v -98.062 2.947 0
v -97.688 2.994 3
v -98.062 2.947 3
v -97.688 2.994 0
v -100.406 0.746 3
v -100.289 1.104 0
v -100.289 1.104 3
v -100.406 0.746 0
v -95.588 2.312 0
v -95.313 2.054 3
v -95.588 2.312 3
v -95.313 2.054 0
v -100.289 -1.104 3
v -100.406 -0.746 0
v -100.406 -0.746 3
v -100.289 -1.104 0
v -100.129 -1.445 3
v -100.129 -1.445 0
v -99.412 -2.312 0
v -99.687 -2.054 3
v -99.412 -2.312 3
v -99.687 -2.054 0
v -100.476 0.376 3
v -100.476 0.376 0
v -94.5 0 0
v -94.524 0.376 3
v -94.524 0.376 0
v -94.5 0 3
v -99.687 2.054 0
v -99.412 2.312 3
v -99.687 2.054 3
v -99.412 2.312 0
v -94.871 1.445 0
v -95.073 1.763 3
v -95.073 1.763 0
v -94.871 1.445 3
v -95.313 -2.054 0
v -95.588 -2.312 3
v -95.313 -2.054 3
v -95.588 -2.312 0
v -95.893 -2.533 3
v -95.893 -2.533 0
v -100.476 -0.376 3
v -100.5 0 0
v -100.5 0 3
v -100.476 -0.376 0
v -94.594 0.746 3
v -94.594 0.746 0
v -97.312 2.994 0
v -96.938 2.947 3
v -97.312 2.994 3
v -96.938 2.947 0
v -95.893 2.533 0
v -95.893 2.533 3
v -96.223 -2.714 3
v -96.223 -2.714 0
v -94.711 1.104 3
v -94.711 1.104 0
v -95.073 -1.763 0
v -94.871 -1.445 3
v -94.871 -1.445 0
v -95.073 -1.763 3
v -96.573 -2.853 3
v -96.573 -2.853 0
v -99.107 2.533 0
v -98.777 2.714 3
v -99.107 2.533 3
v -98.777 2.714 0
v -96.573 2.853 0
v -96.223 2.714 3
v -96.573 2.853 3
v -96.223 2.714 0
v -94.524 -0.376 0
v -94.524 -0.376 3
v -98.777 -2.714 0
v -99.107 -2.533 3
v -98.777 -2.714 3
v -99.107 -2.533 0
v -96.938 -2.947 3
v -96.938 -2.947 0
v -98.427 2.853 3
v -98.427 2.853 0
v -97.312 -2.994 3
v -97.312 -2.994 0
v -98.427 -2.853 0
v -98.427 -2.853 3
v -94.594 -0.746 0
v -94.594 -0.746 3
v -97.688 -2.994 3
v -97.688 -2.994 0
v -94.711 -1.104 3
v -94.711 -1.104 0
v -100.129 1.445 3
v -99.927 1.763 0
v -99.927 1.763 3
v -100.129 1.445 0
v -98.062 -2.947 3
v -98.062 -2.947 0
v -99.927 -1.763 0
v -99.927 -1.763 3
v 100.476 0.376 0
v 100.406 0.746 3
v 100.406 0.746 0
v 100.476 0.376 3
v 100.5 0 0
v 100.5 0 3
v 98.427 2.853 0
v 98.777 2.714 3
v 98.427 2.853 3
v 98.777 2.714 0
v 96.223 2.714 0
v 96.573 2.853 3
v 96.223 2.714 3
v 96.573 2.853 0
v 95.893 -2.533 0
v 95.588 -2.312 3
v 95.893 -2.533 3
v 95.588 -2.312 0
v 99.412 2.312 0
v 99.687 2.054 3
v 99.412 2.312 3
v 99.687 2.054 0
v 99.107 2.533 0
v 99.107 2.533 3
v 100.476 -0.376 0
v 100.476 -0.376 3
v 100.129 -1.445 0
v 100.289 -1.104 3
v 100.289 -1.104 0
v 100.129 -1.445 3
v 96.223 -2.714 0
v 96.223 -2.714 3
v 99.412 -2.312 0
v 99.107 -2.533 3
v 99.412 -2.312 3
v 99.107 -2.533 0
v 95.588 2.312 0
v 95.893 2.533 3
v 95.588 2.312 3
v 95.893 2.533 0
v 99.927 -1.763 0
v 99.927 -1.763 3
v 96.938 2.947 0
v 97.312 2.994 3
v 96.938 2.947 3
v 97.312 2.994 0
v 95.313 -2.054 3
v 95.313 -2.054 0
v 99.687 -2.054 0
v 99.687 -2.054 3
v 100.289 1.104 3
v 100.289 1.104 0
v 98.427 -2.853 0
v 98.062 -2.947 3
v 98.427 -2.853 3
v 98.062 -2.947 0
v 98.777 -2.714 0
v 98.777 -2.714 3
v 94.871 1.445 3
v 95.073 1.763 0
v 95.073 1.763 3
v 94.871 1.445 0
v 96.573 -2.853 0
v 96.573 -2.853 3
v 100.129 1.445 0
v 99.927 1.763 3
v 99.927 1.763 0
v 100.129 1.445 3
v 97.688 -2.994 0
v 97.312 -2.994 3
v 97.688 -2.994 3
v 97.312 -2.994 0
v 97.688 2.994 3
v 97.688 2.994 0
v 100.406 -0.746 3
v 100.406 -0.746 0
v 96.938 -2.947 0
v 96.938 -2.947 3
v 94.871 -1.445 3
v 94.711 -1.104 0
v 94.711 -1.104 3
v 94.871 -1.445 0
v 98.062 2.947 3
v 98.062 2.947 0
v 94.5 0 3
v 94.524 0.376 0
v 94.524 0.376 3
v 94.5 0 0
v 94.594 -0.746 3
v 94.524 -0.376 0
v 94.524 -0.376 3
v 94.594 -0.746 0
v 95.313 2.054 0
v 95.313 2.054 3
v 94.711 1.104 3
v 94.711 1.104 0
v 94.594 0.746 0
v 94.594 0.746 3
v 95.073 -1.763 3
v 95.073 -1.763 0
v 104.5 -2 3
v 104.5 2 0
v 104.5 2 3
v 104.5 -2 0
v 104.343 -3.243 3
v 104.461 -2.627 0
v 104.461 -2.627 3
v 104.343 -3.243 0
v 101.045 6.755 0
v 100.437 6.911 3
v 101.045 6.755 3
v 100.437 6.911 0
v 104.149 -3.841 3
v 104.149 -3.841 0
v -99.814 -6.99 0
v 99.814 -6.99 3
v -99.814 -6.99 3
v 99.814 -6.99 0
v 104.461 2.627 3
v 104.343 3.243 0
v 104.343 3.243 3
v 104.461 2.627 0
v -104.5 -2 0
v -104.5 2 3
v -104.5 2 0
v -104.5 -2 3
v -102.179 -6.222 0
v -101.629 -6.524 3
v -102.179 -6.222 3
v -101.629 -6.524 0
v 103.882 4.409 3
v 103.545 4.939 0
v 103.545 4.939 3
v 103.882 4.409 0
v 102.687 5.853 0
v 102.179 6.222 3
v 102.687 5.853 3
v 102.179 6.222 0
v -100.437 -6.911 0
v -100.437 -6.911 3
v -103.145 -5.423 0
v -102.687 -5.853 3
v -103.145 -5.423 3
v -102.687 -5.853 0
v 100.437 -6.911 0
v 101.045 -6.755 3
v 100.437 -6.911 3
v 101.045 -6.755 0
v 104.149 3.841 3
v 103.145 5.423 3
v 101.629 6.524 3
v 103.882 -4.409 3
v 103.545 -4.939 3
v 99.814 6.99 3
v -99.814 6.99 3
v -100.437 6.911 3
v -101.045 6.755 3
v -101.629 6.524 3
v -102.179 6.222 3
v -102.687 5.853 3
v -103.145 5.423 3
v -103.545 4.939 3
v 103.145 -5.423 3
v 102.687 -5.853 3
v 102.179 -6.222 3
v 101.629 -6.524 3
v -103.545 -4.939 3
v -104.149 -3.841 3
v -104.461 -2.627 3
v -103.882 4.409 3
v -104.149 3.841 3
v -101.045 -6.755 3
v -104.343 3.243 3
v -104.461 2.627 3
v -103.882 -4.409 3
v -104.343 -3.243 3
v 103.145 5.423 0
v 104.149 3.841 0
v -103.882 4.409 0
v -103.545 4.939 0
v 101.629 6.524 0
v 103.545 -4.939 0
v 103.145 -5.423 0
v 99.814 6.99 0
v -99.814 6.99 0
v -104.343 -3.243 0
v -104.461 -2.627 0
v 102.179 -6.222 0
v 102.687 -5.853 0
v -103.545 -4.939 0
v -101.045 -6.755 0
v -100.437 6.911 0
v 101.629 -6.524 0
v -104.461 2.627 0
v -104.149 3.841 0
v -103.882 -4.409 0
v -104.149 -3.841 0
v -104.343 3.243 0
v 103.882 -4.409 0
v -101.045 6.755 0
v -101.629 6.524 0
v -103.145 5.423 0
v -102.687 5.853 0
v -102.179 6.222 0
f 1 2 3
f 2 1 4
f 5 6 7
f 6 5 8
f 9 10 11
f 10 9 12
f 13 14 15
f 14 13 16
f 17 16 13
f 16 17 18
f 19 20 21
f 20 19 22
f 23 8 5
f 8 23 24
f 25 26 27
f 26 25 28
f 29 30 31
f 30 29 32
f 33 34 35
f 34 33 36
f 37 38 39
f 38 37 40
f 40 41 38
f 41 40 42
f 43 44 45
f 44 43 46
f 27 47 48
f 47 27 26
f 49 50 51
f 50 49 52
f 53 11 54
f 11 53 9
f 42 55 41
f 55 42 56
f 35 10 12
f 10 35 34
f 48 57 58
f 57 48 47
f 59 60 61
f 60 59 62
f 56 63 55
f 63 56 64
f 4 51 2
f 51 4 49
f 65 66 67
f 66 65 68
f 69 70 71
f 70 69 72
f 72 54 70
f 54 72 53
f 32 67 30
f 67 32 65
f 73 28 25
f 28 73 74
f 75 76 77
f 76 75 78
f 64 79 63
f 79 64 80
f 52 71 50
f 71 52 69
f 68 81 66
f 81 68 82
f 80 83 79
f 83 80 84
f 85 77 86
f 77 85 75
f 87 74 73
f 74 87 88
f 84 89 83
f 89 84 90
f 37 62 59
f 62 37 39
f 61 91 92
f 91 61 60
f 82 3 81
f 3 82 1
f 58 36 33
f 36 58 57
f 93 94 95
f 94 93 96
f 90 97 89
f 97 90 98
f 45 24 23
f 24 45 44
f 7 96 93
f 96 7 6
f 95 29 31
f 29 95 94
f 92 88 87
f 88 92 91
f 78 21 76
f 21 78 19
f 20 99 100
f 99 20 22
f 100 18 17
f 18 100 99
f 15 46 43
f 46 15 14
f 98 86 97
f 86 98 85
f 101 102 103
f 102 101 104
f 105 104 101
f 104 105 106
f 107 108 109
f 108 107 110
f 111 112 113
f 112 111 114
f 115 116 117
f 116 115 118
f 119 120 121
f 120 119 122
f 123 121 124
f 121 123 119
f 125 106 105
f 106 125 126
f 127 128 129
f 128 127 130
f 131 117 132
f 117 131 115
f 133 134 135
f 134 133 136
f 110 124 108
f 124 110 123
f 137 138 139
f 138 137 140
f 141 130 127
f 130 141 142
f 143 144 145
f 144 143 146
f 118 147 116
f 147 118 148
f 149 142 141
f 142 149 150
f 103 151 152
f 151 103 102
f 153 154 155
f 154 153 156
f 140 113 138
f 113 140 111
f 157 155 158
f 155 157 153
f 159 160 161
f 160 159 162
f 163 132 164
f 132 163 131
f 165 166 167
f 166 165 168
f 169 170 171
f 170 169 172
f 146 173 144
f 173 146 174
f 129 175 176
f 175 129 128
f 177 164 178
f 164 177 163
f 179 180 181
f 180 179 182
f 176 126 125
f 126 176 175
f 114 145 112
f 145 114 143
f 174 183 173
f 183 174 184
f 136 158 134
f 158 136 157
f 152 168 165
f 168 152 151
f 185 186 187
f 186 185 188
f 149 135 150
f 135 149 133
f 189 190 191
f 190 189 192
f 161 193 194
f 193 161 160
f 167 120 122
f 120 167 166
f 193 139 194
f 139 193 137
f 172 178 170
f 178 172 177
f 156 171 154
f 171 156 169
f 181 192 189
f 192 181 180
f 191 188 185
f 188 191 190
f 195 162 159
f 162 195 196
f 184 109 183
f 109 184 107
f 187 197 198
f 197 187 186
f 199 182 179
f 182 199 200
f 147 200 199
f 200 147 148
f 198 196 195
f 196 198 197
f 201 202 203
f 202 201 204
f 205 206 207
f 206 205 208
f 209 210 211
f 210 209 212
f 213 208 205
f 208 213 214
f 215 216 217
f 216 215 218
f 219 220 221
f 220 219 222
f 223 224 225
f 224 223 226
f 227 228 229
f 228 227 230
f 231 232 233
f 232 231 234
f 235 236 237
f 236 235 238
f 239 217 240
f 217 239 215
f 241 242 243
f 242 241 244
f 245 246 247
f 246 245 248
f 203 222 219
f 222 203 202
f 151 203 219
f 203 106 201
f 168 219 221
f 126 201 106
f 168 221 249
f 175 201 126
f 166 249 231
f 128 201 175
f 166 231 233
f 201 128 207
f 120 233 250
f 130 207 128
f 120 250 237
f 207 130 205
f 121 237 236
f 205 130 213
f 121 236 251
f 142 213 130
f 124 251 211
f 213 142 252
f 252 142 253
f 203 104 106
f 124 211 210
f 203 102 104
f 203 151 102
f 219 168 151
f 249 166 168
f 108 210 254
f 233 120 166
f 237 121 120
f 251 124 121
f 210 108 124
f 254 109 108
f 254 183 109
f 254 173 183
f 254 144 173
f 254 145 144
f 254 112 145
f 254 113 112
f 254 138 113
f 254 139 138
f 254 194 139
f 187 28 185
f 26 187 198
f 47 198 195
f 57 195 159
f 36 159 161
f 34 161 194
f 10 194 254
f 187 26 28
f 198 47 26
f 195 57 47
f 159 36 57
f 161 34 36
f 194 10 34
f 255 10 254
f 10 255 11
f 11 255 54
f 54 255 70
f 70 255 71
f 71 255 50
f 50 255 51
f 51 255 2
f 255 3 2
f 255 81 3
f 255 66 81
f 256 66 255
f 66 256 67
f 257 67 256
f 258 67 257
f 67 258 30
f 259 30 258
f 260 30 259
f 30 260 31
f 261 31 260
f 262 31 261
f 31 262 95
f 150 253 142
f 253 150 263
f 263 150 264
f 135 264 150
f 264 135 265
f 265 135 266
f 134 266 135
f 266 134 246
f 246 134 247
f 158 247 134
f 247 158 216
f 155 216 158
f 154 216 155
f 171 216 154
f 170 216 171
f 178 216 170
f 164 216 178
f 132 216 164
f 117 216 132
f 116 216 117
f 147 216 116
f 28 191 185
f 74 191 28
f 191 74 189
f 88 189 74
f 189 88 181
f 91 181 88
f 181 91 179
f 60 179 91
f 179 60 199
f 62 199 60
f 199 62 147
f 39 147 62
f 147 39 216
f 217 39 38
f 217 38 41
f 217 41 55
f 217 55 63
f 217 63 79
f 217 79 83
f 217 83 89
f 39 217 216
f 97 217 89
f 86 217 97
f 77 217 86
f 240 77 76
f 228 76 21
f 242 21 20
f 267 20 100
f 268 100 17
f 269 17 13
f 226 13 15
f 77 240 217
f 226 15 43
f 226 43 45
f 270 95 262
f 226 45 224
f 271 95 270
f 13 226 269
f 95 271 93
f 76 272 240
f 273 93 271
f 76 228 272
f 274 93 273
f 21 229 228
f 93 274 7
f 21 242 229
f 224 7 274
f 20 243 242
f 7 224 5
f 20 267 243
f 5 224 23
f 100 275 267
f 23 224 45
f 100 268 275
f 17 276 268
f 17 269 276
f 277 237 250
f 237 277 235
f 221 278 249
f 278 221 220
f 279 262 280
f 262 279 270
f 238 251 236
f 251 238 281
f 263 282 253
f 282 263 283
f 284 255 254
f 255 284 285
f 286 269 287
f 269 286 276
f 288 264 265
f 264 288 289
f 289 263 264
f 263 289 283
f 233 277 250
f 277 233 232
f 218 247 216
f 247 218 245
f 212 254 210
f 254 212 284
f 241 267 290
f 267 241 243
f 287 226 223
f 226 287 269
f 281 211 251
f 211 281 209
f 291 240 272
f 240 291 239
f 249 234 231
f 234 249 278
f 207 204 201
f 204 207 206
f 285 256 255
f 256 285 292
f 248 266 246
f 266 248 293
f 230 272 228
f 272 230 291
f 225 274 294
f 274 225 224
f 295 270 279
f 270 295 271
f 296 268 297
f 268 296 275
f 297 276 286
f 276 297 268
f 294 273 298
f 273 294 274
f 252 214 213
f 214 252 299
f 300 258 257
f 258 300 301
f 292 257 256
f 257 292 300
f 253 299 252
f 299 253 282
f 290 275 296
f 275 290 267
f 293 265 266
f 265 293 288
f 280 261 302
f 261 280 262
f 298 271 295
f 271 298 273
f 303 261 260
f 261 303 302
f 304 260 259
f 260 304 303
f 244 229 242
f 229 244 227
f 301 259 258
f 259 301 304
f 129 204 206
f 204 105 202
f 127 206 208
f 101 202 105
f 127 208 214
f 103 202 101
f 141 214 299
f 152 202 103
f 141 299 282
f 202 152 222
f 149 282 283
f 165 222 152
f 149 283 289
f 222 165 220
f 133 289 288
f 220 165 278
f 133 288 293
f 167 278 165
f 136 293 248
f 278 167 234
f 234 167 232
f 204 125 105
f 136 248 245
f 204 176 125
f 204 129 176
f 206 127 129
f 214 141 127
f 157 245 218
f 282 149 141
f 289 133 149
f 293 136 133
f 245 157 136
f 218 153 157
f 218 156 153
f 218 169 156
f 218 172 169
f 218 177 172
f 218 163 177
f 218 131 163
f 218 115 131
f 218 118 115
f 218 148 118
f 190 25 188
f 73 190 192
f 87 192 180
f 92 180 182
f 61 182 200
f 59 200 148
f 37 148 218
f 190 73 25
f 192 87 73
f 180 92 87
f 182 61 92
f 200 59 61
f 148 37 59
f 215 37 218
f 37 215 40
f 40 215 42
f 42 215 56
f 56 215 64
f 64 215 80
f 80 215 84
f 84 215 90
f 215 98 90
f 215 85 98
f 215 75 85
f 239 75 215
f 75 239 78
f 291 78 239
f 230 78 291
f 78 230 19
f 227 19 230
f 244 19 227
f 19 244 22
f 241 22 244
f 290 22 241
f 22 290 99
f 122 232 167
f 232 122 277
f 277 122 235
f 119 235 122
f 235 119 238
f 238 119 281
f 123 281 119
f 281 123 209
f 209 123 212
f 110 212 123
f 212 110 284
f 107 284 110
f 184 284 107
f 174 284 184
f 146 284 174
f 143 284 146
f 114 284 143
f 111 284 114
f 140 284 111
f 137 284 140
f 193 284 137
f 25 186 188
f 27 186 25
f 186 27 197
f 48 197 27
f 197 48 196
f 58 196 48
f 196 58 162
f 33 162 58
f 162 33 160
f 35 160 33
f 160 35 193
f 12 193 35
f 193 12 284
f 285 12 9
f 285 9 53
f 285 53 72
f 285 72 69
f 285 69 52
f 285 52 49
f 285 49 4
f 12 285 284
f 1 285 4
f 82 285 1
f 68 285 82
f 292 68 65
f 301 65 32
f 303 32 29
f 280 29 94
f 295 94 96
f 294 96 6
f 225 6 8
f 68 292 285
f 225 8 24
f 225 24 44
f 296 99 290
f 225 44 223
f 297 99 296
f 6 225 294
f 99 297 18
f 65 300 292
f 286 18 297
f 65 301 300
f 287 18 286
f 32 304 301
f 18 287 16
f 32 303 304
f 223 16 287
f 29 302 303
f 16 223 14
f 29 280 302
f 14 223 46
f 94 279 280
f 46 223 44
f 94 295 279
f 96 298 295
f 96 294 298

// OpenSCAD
$fn = 50;


difference() {
	union() {
		hull() {
			translate(v = [-99.5000000000, 2.0000000000, 0]) {
				cylinder(h = 3, r = 5);
			}
			translate(v = [99.5000000000, 2.0000000000, 0]) {
				cylinder(h = 3, r = 5);
			}
			translate(v = [-99.5000000000, -2.0000000000, 0]) {
				cylinder(h = 3, r = 5);
			}
			translate(v = [99.5000000000, -2.0000000000, 0]) {
				cylinder(h = 3, r = 5);
			}
		}
	}
	union() {
		translate(v = [-97.5000000000, 0.0000000000, -100.0000000000]) {
			cylinder(h = 200, r = 3.0000000000);
		}
		translate(v = [-97.5000000000, 0.0000000000, -100.0000000000]) {
			cylinder(h = 200, r = 3.0000000000);
		}
		translate(v = [97.5000000000, 0.0000000000, -100.0000000000]) {
			cylinder(h = 200, r = 3.0000000000);
		}
		translate(v = [97.5000000000, 0.0000000000, -100.0000000000]) {
			cylinder(h = 200, r = 3.0000000000);
		}
	}
}
